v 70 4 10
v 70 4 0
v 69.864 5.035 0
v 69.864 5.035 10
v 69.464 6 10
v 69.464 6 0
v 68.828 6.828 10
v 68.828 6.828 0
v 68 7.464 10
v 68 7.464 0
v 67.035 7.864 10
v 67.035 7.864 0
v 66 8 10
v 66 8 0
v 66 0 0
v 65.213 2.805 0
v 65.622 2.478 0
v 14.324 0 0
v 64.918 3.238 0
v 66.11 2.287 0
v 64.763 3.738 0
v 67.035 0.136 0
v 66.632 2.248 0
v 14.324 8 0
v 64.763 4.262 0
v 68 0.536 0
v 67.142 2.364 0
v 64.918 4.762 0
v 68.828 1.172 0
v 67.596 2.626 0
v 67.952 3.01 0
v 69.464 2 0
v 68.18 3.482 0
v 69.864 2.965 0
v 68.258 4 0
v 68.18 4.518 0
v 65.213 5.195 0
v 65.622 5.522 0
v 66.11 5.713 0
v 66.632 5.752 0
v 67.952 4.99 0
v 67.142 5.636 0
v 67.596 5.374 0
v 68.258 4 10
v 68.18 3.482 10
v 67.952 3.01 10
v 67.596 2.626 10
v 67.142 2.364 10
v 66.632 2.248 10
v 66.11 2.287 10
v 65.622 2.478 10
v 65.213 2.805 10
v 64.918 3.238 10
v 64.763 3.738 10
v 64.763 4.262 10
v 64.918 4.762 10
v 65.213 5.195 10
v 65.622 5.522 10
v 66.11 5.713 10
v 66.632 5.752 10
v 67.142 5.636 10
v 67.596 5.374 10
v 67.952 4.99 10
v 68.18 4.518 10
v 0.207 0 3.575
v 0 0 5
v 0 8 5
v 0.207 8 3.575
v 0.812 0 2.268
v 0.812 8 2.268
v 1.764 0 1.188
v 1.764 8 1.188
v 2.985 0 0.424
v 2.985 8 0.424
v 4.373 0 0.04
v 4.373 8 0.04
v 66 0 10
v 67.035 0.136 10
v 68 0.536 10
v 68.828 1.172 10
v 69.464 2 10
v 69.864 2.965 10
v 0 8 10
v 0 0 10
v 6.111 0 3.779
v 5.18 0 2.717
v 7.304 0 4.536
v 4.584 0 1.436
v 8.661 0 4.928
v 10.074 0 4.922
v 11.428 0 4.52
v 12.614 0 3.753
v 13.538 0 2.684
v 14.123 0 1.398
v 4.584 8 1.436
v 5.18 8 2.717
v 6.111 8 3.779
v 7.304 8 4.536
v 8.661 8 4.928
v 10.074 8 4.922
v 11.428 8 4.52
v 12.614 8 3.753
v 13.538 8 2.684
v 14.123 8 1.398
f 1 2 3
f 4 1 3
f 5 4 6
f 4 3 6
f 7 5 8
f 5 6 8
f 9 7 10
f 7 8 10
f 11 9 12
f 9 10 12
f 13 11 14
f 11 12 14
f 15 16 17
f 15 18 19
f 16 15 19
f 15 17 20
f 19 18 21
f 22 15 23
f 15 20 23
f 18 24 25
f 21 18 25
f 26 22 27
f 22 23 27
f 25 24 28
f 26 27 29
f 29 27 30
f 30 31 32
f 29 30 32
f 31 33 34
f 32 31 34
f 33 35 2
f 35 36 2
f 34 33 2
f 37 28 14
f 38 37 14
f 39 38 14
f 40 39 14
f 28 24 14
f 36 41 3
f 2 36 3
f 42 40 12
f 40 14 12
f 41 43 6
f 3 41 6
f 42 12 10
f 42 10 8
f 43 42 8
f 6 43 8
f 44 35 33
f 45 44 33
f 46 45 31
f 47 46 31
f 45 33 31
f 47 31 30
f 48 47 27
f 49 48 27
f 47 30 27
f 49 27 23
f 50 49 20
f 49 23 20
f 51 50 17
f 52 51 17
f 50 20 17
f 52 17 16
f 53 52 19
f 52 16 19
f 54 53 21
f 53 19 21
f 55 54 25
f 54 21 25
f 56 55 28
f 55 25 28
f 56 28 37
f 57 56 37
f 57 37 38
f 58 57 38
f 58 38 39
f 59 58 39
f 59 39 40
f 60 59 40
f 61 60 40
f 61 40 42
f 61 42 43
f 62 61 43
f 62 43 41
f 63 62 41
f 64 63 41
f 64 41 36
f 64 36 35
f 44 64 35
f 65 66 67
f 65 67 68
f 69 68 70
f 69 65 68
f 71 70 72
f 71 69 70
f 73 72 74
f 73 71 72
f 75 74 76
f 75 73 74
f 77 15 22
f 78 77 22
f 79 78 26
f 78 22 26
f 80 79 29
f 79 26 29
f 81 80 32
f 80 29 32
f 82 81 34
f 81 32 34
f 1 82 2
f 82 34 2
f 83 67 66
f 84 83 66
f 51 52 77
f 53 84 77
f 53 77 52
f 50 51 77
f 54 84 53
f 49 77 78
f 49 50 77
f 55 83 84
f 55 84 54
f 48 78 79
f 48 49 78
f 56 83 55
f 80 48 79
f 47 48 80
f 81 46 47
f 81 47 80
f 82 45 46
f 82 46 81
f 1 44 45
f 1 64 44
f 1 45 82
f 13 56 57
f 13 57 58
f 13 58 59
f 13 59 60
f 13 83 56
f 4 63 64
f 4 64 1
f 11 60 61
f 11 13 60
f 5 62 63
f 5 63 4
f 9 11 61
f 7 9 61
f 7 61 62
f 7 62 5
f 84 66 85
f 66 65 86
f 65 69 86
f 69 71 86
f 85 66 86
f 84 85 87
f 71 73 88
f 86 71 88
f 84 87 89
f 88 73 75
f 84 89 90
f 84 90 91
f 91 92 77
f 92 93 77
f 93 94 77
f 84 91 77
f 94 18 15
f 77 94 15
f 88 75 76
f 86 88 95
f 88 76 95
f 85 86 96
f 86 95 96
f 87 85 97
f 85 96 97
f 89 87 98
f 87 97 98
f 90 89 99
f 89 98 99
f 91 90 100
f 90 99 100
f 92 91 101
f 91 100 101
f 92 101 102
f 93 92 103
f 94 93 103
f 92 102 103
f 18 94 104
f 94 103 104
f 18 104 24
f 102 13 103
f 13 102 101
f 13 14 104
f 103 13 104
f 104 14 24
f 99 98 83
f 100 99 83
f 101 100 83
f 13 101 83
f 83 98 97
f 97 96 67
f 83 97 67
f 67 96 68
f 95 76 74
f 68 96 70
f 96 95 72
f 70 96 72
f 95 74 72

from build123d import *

# Parameters (mm, degrees)
F1_DEPTH = 10
F2_R     = 5
F3_R     = 4.975574
F4_DEPTH = 25
F5_R     = 1.756999
F6_DEPTH = 25


with BuildPart() as f1:
    # F0 (on Top) → F1 (new body)
    with BuildSketch(Plane.XY):
        with BuildLine():
            Line((0, 8), (0, 0))
            Line((0, 0), (66, 0))
            ThreePointArc((66, 0), (68.828427, 1.171573), (70, 4))
            ThreePointArc((70, 4), (68.828427, 6.828427), (66, 8))
            Line((66, 8), (0, 8))
        make_face()
    extrude(amount=F1_DEPTH)

    # F2
    f2_edges = [f1.edges().sort_by_distance(p)[0] for p in [
        (0, 4, 0),
    ]]
    fillet(f2_edges, radius=F2_R)

    # F3 (on face) → F4 (cut)
    with BuildSketch(Plane(origin=(0, 8, 0), x_dir=(-1, 0, 0), z_dir=(0, 1, 0))):
        with Locations((-9.348009, 0)):
            Circle(F3_R)
    extrude(amount=-F4_DEPTH, mode=Mode.SUBTRACT)

    # F5 (on face) → F6 (cut)
    with BuildSketch(Plane(origin=(0, 0, 0), x_dir=(1, 0, 0), z_dir=(0, 0, -1))):
        with Locations((66.500589, -4)):
            Circle(F5_R)
    extrude(amount=-F6_DEPTH, mode=Mode.SUBTRACT)


solid = f1.part
